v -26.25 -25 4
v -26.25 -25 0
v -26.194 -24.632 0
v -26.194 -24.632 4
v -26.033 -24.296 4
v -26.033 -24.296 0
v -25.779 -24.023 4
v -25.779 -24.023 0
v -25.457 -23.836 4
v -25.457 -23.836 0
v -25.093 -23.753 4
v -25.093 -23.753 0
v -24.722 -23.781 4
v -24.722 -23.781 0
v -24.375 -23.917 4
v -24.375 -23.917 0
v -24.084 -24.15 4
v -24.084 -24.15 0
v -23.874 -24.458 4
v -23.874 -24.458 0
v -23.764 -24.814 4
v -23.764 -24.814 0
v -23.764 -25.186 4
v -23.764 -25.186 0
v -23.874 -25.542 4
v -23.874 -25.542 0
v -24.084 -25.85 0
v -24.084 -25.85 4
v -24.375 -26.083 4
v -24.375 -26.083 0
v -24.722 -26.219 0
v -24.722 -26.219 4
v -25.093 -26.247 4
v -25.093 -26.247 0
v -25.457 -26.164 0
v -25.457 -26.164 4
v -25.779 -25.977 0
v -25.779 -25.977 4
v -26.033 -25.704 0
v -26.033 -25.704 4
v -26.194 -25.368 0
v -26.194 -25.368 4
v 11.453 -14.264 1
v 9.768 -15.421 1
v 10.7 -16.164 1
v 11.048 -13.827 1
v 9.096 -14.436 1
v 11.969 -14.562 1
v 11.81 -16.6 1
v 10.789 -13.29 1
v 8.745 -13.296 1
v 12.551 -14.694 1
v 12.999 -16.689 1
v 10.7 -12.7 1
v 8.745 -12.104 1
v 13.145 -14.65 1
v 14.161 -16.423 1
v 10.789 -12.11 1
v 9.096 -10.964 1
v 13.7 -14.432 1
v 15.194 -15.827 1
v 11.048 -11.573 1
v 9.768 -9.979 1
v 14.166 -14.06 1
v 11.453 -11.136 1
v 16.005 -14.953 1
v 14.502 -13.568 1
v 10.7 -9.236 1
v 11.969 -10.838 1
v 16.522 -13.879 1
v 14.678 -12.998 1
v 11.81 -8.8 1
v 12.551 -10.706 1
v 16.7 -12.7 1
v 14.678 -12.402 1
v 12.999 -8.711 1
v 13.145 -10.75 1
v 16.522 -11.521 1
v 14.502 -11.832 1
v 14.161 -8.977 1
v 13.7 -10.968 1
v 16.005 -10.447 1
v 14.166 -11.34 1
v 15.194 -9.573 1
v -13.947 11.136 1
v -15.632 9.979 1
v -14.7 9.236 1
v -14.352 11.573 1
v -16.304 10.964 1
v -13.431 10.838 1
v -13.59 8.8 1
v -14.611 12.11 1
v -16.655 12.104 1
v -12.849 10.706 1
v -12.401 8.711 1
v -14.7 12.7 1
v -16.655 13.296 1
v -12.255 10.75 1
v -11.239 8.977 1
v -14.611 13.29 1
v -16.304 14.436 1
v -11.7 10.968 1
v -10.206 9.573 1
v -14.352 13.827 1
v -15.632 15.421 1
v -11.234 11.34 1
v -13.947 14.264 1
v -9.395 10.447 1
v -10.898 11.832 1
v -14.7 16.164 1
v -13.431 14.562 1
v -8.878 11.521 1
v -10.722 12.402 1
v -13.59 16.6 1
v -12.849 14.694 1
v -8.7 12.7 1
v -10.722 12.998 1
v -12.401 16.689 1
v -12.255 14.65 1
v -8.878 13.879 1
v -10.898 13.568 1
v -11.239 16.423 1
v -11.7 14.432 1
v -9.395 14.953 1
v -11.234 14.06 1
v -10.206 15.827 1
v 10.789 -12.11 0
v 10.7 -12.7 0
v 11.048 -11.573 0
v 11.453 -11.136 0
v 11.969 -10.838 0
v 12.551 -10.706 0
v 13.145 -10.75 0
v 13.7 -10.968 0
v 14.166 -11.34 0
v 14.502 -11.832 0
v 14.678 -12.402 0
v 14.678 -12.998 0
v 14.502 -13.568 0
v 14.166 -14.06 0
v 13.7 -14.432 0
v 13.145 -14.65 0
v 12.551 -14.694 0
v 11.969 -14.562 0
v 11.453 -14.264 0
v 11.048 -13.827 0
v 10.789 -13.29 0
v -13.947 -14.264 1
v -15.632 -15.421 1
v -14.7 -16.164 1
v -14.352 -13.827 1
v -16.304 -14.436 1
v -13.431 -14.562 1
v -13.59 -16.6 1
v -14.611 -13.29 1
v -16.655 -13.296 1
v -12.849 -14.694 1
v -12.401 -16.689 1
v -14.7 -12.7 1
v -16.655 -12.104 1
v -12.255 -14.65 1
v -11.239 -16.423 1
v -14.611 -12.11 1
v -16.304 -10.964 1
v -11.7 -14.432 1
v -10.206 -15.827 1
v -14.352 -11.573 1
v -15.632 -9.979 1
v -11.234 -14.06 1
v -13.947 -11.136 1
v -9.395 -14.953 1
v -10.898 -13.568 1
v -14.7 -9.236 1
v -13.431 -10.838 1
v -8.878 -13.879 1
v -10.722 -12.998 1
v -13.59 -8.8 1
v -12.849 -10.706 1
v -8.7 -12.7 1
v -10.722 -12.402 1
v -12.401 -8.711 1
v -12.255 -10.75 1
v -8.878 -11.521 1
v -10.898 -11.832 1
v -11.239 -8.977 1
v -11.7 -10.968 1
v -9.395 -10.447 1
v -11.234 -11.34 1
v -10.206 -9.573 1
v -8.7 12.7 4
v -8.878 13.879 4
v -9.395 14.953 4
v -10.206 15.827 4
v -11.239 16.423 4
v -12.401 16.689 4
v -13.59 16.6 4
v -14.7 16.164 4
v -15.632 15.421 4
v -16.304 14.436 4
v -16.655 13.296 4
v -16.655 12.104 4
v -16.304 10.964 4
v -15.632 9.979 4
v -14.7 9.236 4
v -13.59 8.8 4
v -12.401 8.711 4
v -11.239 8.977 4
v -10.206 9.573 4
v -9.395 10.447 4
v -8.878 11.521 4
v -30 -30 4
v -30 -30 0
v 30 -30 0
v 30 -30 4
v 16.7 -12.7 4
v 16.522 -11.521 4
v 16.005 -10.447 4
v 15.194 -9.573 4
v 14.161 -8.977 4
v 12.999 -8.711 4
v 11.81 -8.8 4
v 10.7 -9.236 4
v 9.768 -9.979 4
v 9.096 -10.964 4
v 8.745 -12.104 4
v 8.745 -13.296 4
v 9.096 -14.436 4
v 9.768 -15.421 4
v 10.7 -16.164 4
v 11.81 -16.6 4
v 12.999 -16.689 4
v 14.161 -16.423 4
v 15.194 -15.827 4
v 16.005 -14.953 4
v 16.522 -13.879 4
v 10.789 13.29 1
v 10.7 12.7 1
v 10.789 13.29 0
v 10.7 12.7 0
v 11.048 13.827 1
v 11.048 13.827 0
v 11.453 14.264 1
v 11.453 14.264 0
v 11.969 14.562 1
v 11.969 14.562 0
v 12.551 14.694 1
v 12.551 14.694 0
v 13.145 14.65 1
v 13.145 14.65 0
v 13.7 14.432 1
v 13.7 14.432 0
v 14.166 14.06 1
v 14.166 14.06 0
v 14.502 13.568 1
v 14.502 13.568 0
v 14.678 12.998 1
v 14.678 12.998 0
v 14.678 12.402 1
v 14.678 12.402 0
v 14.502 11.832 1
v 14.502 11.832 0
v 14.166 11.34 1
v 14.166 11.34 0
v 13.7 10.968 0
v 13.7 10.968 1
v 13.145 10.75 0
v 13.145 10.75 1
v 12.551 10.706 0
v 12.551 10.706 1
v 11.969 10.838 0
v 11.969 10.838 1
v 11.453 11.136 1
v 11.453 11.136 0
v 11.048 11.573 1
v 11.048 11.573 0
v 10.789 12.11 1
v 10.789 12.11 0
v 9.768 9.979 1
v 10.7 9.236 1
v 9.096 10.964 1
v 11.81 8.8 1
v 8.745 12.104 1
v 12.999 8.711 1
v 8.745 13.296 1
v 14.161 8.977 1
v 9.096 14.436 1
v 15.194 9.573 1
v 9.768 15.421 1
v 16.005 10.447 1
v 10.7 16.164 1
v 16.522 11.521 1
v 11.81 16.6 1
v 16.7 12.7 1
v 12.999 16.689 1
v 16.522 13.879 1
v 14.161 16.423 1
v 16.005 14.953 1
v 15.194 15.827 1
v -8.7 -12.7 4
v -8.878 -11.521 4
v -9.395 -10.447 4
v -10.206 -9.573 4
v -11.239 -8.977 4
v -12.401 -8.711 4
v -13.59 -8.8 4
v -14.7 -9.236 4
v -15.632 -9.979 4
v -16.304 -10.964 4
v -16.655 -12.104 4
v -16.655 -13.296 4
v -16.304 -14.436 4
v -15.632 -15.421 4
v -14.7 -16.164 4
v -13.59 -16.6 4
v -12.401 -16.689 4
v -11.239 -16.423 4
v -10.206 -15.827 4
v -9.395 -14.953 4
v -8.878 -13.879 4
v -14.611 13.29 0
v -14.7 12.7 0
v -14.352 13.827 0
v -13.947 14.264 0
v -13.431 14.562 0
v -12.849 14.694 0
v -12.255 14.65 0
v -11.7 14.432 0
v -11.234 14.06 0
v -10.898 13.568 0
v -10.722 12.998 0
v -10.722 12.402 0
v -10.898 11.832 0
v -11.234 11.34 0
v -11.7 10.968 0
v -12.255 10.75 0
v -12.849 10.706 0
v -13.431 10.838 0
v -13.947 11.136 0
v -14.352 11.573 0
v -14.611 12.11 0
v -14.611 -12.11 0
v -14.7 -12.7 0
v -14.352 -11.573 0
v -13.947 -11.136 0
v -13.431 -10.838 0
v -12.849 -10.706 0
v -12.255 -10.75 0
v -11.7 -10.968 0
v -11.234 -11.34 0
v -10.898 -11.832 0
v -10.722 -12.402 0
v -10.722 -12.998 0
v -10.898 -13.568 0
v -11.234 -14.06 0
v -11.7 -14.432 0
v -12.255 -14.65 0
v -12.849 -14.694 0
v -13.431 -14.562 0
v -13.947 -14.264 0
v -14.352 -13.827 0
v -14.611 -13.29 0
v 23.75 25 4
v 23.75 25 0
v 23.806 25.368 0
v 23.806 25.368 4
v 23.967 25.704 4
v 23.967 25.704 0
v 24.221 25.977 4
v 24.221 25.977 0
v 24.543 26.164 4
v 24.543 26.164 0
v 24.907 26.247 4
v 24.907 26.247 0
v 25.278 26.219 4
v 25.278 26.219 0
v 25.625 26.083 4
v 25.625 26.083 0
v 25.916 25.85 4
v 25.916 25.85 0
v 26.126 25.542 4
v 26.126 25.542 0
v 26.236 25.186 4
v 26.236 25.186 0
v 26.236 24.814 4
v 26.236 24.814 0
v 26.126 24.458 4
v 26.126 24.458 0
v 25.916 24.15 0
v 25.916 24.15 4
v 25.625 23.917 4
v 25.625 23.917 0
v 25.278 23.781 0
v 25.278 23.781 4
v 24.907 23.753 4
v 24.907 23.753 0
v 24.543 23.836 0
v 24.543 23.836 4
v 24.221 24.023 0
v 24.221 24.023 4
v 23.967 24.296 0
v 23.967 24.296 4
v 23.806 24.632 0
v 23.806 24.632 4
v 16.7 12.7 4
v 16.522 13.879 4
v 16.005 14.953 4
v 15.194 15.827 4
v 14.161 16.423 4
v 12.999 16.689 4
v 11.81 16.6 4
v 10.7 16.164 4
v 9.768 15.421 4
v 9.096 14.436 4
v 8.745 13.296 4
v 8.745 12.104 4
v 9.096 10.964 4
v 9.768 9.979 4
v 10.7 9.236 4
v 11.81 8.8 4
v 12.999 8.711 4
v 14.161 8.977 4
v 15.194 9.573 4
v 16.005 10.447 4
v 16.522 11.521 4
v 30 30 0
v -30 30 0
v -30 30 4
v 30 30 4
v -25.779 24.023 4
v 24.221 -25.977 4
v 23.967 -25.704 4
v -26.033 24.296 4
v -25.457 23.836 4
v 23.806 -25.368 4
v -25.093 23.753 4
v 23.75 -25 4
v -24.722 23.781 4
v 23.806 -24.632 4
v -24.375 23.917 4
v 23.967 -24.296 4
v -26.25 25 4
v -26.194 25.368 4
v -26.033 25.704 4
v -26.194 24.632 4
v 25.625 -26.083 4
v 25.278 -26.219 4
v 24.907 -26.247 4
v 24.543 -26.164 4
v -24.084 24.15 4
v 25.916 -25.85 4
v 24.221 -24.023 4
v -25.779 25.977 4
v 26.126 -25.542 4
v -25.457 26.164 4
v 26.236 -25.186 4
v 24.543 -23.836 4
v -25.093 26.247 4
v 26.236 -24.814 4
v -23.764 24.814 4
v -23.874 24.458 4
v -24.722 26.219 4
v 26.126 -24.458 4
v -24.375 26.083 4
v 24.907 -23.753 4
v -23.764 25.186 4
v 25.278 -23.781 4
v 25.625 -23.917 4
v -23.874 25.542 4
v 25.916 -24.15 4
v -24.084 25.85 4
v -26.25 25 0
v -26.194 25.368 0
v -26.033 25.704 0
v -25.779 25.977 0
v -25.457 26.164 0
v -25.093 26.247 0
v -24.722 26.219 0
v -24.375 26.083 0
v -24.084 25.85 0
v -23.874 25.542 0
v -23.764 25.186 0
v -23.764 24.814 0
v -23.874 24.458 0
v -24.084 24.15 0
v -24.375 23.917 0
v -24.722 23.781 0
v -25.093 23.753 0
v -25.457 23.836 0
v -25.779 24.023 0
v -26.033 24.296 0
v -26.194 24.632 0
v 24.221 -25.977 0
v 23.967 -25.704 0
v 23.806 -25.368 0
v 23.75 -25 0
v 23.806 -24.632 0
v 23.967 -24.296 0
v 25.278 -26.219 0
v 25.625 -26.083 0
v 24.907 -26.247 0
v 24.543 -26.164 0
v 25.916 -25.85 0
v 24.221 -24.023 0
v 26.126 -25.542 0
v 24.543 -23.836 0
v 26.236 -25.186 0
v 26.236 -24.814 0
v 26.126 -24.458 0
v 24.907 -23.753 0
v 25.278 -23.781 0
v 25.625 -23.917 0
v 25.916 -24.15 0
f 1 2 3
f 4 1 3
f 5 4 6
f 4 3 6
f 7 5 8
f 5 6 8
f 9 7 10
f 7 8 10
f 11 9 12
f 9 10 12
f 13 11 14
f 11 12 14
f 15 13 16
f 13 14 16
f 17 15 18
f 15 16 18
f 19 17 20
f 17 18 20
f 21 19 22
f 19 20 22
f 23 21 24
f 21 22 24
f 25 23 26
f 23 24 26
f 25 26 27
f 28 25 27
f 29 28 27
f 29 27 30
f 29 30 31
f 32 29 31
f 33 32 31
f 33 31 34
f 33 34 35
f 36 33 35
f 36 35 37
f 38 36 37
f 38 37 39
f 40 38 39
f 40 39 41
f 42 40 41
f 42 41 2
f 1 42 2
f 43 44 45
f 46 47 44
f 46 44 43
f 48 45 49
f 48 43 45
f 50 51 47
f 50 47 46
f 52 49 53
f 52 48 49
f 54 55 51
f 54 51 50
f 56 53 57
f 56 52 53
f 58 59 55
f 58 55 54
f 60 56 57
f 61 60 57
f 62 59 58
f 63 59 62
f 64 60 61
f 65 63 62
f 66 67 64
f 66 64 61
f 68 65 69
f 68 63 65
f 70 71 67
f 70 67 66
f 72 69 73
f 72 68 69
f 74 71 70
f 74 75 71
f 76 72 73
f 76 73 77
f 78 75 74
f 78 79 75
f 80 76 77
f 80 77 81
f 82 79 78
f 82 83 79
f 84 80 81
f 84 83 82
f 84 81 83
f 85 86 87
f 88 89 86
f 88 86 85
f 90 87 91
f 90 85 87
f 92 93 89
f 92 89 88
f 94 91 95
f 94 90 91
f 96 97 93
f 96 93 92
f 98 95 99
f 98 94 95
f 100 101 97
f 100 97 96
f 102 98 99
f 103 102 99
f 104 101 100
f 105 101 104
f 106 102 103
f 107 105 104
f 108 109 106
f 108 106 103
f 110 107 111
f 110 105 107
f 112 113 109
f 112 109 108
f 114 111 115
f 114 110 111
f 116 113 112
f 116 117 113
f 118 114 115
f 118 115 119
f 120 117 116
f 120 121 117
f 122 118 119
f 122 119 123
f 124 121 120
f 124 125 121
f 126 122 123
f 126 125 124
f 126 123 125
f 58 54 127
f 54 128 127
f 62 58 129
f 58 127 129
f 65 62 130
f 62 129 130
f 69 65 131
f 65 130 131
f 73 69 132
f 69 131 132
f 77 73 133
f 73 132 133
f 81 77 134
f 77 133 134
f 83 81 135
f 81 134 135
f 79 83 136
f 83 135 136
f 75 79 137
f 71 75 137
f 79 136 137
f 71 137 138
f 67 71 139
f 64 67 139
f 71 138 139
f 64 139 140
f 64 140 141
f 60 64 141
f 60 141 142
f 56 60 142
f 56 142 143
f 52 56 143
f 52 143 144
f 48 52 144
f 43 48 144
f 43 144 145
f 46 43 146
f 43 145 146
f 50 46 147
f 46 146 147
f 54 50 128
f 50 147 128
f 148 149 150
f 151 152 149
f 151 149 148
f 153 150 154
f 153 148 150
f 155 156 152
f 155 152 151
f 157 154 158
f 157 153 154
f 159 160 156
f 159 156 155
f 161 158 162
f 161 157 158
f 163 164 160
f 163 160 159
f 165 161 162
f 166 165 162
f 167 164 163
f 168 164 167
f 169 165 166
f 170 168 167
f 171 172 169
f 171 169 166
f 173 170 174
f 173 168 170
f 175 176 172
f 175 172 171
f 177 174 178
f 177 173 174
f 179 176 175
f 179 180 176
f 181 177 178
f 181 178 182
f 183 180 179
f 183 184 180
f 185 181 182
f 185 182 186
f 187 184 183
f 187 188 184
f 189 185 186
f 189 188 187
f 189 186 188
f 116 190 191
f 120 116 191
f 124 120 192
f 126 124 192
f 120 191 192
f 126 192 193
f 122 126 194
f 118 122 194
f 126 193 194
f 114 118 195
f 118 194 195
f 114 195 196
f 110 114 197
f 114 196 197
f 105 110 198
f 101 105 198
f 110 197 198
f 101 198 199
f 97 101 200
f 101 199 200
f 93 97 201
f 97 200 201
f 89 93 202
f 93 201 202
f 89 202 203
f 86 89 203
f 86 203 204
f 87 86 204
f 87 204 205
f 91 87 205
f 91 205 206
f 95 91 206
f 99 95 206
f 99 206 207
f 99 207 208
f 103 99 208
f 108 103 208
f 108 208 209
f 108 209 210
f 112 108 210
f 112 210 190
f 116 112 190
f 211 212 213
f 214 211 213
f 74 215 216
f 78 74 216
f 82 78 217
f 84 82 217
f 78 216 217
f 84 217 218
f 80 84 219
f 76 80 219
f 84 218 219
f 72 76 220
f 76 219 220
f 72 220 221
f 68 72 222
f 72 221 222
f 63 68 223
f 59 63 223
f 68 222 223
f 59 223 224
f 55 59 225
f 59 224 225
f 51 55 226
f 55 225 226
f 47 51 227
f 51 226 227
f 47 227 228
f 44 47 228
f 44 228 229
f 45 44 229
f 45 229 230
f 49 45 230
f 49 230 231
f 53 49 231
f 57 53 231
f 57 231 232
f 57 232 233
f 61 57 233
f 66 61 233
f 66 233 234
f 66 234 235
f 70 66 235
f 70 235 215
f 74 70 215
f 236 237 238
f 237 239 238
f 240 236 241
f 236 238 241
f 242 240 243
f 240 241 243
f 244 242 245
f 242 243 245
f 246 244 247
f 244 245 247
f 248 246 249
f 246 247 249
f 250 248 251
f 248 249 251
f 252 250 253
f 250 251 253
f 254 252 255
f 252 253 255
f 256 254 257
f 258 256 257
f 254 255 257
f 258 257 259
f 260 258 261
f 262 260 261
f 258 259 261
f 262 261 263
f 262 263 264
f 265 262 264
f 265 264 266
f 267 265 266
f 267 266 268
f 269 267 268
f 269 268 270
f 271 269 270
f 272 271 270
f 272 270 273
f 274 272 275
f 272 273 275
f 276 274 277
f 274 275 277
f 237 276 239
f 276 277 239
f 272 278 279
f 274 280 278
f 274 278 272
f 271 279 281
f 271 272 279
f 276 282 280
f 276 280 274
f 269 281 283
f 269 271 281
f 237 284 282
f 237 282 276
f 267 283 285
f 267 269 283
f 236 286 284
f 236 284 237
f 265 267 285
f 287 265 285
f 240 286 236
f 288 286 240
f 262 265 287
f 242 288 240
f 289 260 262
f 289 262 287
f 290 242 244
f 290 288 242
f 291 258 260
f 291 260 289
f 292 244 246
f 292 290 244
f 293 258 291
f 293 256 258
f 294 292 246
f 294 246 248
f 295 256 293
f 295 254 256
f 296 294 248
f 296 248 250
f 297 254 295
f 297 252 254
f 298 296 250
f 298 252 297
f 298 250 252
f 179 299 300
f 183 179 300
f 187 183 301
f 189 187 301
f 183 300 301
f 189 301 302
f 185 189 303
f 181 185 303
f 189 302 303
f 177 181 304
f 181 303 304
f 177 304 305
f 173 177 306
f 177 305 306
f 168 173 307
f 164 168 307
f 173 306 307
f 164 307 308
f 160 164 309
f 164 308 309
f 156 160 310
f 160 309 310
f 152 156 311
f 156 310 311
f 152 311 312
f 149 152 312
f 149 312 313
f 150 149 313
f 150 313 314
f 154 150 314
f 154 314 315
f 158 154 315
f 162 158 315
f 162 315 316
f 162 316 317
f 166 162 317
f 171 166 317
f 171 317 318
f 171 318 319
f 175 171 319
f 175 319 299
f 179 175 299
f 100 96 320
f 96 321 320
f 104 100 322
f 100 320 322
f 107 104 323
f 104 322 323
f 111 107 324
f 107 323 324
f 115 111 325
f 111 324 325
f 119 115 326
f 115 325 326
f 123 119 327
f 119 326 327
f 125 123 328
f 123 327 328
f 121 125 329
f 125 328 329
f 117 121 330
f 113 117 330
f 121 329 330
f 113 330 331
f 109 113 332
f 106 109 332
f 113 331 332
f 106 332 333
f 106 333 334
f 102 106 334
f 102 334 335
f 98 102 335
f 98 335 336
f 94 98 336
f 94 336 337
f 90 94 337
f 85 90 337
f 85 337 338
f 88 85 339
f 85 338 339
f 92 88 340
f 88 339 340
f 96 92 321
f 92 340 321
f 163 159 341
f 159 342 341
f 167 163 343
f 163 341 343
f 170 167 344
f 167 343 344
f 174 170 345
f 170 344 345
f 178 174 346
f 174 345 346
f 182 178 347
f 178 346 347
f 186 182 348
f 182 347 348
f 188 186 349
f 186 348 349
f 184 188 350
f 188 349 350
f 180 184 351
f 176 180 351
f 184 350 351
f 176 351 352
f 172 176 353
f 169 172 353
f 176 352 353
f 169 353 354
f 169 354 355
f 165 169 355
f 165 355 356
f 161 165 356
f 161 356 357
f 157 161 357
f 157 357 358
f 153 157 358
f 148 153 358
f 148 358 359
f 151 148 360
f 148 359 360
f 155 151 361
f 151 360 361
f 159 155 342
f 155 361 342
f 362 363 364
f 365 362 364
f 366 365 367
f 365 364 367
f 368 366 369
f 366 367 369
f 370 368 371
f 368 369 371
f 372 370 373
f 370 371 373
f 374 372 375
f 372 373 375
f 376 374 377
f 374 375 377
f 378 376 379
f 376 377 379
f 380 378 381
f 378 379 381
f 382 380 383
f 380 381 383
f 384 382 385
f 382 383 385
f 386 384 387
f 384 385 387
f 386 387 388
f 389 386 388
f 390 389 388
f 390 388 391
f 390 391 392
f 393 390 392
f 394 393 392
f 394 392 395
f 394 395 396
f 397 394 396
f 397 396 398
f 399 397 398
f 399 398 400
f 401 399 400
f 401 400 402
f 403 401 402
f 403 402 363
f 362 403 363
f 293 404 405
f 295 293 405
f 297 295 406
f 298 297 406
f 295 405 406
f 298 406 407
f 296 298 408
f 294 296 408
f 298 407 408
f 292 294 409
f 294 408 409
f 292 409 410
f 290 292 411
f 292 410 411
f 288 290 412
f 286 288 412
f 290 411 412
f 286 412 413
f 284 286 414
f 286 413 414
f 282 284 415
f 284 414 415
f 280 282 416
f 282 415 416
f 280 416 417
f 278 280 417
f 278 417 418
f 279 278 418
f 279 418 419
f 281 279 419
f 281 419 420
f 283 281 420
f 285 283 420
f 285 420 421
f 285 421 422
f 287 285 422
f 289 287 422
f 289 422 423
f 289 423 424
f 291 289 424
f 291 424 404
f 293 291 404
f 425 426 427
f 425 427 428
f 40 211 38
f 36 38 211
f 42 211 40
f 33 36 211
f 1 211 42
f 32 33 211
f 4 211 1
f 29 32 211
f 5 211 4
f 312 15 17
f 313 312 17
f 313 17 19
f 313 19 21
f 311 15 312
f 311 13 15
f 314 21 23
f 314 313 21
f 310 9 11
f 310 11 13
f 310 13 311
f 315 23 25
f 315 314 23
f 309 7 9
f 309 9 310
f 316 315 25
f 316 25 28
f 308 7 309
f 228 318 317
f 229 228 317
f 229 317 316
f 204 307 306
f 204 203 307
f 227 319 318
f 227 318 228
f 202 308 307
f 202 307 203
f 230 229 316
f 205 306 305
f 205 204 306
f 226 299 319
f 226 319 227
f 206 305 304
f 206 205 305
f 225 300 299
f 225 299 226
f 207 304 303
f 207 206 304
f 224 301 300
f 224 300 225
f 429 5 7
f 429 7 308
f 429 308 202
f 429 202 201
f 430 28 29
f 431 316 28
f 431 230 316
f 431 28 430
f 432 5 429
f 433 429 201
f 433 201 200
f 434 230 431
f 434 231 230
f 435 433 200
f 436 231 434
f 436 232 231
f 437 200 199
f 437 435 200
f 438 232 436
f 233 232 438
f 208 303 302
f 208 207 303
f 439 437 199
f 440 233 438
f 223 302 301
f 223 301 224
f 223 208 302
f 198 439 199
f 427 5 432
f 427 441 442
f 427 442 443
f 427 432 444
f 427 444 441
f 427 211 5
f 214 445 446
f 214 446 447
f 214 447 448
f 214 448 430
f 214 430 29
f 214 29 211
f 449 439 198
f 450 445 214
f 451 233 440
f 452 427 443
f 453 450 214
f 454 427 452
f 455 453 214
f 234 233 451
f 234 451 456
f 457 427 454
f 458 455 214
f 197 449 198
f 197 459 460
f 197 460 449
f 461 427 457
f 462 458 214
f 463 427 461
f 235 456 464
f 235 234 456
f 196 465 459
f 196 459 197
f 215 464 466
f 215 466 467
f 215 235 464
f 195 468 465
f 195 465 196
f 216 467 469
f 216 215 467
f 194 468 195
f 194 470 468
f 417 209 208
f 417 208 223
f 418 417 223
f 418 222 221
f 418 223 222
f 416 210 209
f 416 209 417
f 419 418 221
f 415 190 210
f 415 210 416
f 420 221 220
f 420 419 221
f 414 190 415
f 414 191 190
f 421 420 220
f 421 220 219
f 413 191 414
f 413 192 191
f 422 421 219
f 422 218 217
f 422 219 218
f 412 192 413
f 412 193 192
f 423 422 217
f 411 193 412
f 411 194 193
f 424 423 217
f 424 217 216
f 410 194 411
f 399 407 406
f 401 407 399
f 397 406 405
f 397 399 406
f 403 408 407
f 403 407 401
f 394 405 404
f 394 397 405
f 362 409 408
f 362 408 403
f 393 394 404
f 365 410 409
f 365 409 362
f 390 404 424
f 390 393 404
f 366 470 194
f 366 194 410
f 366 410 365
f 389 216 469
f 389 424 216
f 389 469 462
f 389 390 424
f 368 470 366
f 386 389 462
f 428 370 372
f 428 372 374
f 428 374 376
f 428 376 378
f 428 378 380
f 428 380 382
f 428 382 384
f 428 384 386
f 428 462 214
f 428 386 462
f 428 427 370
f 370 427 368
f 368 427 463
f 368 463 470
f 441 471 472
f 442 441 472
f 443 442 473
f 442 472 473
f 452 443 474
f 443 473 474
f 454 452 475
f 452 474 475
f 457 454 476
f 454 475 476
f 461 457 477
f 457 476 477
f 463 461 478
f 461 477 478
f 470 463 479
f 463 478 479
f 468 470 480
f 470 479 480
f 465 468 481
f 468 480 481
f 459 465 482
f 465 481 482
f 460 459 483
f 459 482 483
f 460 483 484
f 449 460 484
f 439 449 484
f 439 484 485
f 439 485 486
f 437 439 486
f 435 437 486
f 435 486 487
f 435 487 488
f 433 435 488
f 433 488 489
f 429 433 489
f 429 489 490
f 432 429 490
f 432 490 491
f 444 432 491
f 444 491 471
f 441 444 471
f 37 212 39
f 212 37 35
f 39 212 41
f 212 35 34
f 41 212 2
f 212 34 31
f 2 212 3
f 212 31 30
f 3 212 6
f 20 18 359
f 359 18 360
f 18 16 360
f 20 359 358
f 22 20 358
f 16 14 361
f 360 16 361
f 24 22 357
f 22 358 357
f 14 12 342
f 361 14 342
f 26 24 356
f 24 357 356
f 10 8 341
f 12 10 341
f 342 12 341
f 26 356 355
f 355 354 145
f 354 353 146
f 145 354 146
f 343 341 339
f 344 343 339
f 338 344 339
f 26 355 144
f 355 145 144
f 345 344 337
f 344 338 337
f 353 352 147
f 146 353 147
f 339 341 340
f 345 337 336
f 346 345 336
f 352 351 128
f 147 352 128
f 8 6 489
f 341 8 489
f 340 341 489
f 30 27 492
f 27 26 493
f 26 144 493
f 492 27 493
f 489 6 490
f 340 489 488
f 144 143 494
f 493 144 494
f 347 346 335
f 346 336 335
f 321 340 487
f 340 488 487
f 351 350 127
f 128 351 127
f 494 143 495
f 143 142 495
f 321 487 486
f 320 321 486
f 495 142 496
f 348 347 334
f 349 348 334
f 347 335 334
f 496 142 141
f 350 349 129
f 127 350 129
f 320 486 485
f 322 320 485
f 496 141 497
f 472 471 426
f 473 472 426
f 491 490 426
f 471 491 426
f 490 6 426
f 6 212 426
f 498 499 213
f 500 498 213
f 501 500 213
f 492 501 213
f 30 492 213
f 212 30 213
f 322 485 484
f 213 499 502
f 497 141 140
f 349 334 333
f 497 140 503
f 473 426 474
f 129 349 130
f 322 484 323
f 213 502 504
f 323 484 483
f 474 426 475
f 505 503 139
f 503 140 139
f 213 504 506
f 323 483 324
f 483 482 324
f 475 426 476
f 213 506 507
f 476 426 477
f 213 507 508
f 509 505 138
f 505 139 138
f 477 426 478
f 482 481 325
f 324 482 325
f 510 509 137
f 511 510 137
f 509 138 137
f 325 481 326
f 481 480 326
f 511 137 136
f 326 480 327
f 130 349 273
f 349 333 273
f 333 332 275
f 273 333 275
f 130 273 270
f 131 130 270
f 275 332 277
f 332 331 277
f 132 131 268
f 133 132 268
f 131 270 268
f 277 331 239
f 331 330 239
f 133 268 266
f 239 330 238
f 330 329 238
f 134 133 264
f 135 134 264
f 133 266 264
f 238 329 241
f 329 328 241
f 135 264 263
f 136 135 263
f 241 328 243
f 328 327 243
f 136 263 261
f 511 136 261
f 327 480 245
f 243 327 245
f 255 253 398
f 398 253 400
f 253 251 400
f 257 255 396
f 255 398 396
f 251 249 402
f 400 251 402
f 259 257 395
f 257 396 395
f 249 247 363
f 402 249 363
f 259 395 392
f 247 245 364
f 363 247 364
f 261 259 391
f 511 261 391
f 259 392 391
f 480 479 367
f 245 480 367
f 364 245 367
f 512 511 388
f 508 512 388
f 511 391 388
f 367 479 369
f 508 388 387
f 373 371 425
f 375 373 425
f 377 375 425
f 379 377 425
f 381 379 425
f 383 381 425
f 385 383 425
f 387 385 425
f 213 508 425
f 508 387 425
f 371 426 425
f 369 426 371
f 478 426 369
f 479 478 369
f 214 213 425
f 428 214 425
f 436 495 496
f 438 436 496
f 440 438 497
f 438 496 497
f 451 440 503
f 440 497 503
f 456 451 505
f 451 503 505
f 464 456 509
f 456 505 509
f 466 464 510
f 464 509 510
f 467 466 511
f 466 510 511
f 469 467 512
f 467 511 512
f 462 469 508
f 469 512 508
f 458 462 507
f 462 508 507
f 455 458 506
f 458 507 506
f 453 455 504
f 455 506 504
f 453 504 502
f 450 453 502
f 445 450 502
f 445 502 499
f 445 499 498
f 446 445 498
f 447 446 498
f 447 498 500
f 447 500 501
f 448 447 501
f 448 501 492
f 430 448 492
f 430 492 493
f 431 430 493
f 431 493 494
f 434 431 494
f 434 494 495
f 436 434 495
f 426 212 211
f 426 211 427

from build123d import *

# Parameters (mm, degrees)
SKETCH_1_W                = 60
SKETCH_1_H                = 60
EXTRUDE_1_DEPTH           = 4
HOLE_WIZARD_M3_1_D        = 2.5
HOLE_WIZARD_1_D           = 4
HOLE_WIZARD_1_CBORE_D     = 8
HOLE_WIZARD_1_CBORE_DEPTH = 3


with BuildPart() as part:
    # 草图1 → 凸台-拉伸1 (new body)
    with BuildSketch(Plane.XY):
        Rectangle(SKETCH_1_W, SKETCH_1_H)
    extrude(amount=EXTRUDE_1_DEPTH)

    # M3 螺纹孔1 (through all)
    with Locations(Plane(origin=(-25, 25, 4), x_dir=(1, 0, 0), z_dir=(0, 0, 1))):
        with Locations((0, 0), (50, 0), (50, -50), (0, -50)):
            Hole(HOLE_WIZARD_M3_1_D / 2)

    # 孔1 (through all)
    with Locations(Plane(origin=(-12.7, 12.7, 4), x_dir=(1, 0, 0), z_dir=(0, 0, 1))):
        with Locations((0, 0), (25.4, 0), (25.4, -25.4), (0, -25.4)):
            CounterBoreHole(HOLE_WIZARD_1_D / 2, HOLE_WIZARD_1_CBORE_D / 2, HOLE_WIZARD_1_CBORE_DEPTH)


solid = part.part
